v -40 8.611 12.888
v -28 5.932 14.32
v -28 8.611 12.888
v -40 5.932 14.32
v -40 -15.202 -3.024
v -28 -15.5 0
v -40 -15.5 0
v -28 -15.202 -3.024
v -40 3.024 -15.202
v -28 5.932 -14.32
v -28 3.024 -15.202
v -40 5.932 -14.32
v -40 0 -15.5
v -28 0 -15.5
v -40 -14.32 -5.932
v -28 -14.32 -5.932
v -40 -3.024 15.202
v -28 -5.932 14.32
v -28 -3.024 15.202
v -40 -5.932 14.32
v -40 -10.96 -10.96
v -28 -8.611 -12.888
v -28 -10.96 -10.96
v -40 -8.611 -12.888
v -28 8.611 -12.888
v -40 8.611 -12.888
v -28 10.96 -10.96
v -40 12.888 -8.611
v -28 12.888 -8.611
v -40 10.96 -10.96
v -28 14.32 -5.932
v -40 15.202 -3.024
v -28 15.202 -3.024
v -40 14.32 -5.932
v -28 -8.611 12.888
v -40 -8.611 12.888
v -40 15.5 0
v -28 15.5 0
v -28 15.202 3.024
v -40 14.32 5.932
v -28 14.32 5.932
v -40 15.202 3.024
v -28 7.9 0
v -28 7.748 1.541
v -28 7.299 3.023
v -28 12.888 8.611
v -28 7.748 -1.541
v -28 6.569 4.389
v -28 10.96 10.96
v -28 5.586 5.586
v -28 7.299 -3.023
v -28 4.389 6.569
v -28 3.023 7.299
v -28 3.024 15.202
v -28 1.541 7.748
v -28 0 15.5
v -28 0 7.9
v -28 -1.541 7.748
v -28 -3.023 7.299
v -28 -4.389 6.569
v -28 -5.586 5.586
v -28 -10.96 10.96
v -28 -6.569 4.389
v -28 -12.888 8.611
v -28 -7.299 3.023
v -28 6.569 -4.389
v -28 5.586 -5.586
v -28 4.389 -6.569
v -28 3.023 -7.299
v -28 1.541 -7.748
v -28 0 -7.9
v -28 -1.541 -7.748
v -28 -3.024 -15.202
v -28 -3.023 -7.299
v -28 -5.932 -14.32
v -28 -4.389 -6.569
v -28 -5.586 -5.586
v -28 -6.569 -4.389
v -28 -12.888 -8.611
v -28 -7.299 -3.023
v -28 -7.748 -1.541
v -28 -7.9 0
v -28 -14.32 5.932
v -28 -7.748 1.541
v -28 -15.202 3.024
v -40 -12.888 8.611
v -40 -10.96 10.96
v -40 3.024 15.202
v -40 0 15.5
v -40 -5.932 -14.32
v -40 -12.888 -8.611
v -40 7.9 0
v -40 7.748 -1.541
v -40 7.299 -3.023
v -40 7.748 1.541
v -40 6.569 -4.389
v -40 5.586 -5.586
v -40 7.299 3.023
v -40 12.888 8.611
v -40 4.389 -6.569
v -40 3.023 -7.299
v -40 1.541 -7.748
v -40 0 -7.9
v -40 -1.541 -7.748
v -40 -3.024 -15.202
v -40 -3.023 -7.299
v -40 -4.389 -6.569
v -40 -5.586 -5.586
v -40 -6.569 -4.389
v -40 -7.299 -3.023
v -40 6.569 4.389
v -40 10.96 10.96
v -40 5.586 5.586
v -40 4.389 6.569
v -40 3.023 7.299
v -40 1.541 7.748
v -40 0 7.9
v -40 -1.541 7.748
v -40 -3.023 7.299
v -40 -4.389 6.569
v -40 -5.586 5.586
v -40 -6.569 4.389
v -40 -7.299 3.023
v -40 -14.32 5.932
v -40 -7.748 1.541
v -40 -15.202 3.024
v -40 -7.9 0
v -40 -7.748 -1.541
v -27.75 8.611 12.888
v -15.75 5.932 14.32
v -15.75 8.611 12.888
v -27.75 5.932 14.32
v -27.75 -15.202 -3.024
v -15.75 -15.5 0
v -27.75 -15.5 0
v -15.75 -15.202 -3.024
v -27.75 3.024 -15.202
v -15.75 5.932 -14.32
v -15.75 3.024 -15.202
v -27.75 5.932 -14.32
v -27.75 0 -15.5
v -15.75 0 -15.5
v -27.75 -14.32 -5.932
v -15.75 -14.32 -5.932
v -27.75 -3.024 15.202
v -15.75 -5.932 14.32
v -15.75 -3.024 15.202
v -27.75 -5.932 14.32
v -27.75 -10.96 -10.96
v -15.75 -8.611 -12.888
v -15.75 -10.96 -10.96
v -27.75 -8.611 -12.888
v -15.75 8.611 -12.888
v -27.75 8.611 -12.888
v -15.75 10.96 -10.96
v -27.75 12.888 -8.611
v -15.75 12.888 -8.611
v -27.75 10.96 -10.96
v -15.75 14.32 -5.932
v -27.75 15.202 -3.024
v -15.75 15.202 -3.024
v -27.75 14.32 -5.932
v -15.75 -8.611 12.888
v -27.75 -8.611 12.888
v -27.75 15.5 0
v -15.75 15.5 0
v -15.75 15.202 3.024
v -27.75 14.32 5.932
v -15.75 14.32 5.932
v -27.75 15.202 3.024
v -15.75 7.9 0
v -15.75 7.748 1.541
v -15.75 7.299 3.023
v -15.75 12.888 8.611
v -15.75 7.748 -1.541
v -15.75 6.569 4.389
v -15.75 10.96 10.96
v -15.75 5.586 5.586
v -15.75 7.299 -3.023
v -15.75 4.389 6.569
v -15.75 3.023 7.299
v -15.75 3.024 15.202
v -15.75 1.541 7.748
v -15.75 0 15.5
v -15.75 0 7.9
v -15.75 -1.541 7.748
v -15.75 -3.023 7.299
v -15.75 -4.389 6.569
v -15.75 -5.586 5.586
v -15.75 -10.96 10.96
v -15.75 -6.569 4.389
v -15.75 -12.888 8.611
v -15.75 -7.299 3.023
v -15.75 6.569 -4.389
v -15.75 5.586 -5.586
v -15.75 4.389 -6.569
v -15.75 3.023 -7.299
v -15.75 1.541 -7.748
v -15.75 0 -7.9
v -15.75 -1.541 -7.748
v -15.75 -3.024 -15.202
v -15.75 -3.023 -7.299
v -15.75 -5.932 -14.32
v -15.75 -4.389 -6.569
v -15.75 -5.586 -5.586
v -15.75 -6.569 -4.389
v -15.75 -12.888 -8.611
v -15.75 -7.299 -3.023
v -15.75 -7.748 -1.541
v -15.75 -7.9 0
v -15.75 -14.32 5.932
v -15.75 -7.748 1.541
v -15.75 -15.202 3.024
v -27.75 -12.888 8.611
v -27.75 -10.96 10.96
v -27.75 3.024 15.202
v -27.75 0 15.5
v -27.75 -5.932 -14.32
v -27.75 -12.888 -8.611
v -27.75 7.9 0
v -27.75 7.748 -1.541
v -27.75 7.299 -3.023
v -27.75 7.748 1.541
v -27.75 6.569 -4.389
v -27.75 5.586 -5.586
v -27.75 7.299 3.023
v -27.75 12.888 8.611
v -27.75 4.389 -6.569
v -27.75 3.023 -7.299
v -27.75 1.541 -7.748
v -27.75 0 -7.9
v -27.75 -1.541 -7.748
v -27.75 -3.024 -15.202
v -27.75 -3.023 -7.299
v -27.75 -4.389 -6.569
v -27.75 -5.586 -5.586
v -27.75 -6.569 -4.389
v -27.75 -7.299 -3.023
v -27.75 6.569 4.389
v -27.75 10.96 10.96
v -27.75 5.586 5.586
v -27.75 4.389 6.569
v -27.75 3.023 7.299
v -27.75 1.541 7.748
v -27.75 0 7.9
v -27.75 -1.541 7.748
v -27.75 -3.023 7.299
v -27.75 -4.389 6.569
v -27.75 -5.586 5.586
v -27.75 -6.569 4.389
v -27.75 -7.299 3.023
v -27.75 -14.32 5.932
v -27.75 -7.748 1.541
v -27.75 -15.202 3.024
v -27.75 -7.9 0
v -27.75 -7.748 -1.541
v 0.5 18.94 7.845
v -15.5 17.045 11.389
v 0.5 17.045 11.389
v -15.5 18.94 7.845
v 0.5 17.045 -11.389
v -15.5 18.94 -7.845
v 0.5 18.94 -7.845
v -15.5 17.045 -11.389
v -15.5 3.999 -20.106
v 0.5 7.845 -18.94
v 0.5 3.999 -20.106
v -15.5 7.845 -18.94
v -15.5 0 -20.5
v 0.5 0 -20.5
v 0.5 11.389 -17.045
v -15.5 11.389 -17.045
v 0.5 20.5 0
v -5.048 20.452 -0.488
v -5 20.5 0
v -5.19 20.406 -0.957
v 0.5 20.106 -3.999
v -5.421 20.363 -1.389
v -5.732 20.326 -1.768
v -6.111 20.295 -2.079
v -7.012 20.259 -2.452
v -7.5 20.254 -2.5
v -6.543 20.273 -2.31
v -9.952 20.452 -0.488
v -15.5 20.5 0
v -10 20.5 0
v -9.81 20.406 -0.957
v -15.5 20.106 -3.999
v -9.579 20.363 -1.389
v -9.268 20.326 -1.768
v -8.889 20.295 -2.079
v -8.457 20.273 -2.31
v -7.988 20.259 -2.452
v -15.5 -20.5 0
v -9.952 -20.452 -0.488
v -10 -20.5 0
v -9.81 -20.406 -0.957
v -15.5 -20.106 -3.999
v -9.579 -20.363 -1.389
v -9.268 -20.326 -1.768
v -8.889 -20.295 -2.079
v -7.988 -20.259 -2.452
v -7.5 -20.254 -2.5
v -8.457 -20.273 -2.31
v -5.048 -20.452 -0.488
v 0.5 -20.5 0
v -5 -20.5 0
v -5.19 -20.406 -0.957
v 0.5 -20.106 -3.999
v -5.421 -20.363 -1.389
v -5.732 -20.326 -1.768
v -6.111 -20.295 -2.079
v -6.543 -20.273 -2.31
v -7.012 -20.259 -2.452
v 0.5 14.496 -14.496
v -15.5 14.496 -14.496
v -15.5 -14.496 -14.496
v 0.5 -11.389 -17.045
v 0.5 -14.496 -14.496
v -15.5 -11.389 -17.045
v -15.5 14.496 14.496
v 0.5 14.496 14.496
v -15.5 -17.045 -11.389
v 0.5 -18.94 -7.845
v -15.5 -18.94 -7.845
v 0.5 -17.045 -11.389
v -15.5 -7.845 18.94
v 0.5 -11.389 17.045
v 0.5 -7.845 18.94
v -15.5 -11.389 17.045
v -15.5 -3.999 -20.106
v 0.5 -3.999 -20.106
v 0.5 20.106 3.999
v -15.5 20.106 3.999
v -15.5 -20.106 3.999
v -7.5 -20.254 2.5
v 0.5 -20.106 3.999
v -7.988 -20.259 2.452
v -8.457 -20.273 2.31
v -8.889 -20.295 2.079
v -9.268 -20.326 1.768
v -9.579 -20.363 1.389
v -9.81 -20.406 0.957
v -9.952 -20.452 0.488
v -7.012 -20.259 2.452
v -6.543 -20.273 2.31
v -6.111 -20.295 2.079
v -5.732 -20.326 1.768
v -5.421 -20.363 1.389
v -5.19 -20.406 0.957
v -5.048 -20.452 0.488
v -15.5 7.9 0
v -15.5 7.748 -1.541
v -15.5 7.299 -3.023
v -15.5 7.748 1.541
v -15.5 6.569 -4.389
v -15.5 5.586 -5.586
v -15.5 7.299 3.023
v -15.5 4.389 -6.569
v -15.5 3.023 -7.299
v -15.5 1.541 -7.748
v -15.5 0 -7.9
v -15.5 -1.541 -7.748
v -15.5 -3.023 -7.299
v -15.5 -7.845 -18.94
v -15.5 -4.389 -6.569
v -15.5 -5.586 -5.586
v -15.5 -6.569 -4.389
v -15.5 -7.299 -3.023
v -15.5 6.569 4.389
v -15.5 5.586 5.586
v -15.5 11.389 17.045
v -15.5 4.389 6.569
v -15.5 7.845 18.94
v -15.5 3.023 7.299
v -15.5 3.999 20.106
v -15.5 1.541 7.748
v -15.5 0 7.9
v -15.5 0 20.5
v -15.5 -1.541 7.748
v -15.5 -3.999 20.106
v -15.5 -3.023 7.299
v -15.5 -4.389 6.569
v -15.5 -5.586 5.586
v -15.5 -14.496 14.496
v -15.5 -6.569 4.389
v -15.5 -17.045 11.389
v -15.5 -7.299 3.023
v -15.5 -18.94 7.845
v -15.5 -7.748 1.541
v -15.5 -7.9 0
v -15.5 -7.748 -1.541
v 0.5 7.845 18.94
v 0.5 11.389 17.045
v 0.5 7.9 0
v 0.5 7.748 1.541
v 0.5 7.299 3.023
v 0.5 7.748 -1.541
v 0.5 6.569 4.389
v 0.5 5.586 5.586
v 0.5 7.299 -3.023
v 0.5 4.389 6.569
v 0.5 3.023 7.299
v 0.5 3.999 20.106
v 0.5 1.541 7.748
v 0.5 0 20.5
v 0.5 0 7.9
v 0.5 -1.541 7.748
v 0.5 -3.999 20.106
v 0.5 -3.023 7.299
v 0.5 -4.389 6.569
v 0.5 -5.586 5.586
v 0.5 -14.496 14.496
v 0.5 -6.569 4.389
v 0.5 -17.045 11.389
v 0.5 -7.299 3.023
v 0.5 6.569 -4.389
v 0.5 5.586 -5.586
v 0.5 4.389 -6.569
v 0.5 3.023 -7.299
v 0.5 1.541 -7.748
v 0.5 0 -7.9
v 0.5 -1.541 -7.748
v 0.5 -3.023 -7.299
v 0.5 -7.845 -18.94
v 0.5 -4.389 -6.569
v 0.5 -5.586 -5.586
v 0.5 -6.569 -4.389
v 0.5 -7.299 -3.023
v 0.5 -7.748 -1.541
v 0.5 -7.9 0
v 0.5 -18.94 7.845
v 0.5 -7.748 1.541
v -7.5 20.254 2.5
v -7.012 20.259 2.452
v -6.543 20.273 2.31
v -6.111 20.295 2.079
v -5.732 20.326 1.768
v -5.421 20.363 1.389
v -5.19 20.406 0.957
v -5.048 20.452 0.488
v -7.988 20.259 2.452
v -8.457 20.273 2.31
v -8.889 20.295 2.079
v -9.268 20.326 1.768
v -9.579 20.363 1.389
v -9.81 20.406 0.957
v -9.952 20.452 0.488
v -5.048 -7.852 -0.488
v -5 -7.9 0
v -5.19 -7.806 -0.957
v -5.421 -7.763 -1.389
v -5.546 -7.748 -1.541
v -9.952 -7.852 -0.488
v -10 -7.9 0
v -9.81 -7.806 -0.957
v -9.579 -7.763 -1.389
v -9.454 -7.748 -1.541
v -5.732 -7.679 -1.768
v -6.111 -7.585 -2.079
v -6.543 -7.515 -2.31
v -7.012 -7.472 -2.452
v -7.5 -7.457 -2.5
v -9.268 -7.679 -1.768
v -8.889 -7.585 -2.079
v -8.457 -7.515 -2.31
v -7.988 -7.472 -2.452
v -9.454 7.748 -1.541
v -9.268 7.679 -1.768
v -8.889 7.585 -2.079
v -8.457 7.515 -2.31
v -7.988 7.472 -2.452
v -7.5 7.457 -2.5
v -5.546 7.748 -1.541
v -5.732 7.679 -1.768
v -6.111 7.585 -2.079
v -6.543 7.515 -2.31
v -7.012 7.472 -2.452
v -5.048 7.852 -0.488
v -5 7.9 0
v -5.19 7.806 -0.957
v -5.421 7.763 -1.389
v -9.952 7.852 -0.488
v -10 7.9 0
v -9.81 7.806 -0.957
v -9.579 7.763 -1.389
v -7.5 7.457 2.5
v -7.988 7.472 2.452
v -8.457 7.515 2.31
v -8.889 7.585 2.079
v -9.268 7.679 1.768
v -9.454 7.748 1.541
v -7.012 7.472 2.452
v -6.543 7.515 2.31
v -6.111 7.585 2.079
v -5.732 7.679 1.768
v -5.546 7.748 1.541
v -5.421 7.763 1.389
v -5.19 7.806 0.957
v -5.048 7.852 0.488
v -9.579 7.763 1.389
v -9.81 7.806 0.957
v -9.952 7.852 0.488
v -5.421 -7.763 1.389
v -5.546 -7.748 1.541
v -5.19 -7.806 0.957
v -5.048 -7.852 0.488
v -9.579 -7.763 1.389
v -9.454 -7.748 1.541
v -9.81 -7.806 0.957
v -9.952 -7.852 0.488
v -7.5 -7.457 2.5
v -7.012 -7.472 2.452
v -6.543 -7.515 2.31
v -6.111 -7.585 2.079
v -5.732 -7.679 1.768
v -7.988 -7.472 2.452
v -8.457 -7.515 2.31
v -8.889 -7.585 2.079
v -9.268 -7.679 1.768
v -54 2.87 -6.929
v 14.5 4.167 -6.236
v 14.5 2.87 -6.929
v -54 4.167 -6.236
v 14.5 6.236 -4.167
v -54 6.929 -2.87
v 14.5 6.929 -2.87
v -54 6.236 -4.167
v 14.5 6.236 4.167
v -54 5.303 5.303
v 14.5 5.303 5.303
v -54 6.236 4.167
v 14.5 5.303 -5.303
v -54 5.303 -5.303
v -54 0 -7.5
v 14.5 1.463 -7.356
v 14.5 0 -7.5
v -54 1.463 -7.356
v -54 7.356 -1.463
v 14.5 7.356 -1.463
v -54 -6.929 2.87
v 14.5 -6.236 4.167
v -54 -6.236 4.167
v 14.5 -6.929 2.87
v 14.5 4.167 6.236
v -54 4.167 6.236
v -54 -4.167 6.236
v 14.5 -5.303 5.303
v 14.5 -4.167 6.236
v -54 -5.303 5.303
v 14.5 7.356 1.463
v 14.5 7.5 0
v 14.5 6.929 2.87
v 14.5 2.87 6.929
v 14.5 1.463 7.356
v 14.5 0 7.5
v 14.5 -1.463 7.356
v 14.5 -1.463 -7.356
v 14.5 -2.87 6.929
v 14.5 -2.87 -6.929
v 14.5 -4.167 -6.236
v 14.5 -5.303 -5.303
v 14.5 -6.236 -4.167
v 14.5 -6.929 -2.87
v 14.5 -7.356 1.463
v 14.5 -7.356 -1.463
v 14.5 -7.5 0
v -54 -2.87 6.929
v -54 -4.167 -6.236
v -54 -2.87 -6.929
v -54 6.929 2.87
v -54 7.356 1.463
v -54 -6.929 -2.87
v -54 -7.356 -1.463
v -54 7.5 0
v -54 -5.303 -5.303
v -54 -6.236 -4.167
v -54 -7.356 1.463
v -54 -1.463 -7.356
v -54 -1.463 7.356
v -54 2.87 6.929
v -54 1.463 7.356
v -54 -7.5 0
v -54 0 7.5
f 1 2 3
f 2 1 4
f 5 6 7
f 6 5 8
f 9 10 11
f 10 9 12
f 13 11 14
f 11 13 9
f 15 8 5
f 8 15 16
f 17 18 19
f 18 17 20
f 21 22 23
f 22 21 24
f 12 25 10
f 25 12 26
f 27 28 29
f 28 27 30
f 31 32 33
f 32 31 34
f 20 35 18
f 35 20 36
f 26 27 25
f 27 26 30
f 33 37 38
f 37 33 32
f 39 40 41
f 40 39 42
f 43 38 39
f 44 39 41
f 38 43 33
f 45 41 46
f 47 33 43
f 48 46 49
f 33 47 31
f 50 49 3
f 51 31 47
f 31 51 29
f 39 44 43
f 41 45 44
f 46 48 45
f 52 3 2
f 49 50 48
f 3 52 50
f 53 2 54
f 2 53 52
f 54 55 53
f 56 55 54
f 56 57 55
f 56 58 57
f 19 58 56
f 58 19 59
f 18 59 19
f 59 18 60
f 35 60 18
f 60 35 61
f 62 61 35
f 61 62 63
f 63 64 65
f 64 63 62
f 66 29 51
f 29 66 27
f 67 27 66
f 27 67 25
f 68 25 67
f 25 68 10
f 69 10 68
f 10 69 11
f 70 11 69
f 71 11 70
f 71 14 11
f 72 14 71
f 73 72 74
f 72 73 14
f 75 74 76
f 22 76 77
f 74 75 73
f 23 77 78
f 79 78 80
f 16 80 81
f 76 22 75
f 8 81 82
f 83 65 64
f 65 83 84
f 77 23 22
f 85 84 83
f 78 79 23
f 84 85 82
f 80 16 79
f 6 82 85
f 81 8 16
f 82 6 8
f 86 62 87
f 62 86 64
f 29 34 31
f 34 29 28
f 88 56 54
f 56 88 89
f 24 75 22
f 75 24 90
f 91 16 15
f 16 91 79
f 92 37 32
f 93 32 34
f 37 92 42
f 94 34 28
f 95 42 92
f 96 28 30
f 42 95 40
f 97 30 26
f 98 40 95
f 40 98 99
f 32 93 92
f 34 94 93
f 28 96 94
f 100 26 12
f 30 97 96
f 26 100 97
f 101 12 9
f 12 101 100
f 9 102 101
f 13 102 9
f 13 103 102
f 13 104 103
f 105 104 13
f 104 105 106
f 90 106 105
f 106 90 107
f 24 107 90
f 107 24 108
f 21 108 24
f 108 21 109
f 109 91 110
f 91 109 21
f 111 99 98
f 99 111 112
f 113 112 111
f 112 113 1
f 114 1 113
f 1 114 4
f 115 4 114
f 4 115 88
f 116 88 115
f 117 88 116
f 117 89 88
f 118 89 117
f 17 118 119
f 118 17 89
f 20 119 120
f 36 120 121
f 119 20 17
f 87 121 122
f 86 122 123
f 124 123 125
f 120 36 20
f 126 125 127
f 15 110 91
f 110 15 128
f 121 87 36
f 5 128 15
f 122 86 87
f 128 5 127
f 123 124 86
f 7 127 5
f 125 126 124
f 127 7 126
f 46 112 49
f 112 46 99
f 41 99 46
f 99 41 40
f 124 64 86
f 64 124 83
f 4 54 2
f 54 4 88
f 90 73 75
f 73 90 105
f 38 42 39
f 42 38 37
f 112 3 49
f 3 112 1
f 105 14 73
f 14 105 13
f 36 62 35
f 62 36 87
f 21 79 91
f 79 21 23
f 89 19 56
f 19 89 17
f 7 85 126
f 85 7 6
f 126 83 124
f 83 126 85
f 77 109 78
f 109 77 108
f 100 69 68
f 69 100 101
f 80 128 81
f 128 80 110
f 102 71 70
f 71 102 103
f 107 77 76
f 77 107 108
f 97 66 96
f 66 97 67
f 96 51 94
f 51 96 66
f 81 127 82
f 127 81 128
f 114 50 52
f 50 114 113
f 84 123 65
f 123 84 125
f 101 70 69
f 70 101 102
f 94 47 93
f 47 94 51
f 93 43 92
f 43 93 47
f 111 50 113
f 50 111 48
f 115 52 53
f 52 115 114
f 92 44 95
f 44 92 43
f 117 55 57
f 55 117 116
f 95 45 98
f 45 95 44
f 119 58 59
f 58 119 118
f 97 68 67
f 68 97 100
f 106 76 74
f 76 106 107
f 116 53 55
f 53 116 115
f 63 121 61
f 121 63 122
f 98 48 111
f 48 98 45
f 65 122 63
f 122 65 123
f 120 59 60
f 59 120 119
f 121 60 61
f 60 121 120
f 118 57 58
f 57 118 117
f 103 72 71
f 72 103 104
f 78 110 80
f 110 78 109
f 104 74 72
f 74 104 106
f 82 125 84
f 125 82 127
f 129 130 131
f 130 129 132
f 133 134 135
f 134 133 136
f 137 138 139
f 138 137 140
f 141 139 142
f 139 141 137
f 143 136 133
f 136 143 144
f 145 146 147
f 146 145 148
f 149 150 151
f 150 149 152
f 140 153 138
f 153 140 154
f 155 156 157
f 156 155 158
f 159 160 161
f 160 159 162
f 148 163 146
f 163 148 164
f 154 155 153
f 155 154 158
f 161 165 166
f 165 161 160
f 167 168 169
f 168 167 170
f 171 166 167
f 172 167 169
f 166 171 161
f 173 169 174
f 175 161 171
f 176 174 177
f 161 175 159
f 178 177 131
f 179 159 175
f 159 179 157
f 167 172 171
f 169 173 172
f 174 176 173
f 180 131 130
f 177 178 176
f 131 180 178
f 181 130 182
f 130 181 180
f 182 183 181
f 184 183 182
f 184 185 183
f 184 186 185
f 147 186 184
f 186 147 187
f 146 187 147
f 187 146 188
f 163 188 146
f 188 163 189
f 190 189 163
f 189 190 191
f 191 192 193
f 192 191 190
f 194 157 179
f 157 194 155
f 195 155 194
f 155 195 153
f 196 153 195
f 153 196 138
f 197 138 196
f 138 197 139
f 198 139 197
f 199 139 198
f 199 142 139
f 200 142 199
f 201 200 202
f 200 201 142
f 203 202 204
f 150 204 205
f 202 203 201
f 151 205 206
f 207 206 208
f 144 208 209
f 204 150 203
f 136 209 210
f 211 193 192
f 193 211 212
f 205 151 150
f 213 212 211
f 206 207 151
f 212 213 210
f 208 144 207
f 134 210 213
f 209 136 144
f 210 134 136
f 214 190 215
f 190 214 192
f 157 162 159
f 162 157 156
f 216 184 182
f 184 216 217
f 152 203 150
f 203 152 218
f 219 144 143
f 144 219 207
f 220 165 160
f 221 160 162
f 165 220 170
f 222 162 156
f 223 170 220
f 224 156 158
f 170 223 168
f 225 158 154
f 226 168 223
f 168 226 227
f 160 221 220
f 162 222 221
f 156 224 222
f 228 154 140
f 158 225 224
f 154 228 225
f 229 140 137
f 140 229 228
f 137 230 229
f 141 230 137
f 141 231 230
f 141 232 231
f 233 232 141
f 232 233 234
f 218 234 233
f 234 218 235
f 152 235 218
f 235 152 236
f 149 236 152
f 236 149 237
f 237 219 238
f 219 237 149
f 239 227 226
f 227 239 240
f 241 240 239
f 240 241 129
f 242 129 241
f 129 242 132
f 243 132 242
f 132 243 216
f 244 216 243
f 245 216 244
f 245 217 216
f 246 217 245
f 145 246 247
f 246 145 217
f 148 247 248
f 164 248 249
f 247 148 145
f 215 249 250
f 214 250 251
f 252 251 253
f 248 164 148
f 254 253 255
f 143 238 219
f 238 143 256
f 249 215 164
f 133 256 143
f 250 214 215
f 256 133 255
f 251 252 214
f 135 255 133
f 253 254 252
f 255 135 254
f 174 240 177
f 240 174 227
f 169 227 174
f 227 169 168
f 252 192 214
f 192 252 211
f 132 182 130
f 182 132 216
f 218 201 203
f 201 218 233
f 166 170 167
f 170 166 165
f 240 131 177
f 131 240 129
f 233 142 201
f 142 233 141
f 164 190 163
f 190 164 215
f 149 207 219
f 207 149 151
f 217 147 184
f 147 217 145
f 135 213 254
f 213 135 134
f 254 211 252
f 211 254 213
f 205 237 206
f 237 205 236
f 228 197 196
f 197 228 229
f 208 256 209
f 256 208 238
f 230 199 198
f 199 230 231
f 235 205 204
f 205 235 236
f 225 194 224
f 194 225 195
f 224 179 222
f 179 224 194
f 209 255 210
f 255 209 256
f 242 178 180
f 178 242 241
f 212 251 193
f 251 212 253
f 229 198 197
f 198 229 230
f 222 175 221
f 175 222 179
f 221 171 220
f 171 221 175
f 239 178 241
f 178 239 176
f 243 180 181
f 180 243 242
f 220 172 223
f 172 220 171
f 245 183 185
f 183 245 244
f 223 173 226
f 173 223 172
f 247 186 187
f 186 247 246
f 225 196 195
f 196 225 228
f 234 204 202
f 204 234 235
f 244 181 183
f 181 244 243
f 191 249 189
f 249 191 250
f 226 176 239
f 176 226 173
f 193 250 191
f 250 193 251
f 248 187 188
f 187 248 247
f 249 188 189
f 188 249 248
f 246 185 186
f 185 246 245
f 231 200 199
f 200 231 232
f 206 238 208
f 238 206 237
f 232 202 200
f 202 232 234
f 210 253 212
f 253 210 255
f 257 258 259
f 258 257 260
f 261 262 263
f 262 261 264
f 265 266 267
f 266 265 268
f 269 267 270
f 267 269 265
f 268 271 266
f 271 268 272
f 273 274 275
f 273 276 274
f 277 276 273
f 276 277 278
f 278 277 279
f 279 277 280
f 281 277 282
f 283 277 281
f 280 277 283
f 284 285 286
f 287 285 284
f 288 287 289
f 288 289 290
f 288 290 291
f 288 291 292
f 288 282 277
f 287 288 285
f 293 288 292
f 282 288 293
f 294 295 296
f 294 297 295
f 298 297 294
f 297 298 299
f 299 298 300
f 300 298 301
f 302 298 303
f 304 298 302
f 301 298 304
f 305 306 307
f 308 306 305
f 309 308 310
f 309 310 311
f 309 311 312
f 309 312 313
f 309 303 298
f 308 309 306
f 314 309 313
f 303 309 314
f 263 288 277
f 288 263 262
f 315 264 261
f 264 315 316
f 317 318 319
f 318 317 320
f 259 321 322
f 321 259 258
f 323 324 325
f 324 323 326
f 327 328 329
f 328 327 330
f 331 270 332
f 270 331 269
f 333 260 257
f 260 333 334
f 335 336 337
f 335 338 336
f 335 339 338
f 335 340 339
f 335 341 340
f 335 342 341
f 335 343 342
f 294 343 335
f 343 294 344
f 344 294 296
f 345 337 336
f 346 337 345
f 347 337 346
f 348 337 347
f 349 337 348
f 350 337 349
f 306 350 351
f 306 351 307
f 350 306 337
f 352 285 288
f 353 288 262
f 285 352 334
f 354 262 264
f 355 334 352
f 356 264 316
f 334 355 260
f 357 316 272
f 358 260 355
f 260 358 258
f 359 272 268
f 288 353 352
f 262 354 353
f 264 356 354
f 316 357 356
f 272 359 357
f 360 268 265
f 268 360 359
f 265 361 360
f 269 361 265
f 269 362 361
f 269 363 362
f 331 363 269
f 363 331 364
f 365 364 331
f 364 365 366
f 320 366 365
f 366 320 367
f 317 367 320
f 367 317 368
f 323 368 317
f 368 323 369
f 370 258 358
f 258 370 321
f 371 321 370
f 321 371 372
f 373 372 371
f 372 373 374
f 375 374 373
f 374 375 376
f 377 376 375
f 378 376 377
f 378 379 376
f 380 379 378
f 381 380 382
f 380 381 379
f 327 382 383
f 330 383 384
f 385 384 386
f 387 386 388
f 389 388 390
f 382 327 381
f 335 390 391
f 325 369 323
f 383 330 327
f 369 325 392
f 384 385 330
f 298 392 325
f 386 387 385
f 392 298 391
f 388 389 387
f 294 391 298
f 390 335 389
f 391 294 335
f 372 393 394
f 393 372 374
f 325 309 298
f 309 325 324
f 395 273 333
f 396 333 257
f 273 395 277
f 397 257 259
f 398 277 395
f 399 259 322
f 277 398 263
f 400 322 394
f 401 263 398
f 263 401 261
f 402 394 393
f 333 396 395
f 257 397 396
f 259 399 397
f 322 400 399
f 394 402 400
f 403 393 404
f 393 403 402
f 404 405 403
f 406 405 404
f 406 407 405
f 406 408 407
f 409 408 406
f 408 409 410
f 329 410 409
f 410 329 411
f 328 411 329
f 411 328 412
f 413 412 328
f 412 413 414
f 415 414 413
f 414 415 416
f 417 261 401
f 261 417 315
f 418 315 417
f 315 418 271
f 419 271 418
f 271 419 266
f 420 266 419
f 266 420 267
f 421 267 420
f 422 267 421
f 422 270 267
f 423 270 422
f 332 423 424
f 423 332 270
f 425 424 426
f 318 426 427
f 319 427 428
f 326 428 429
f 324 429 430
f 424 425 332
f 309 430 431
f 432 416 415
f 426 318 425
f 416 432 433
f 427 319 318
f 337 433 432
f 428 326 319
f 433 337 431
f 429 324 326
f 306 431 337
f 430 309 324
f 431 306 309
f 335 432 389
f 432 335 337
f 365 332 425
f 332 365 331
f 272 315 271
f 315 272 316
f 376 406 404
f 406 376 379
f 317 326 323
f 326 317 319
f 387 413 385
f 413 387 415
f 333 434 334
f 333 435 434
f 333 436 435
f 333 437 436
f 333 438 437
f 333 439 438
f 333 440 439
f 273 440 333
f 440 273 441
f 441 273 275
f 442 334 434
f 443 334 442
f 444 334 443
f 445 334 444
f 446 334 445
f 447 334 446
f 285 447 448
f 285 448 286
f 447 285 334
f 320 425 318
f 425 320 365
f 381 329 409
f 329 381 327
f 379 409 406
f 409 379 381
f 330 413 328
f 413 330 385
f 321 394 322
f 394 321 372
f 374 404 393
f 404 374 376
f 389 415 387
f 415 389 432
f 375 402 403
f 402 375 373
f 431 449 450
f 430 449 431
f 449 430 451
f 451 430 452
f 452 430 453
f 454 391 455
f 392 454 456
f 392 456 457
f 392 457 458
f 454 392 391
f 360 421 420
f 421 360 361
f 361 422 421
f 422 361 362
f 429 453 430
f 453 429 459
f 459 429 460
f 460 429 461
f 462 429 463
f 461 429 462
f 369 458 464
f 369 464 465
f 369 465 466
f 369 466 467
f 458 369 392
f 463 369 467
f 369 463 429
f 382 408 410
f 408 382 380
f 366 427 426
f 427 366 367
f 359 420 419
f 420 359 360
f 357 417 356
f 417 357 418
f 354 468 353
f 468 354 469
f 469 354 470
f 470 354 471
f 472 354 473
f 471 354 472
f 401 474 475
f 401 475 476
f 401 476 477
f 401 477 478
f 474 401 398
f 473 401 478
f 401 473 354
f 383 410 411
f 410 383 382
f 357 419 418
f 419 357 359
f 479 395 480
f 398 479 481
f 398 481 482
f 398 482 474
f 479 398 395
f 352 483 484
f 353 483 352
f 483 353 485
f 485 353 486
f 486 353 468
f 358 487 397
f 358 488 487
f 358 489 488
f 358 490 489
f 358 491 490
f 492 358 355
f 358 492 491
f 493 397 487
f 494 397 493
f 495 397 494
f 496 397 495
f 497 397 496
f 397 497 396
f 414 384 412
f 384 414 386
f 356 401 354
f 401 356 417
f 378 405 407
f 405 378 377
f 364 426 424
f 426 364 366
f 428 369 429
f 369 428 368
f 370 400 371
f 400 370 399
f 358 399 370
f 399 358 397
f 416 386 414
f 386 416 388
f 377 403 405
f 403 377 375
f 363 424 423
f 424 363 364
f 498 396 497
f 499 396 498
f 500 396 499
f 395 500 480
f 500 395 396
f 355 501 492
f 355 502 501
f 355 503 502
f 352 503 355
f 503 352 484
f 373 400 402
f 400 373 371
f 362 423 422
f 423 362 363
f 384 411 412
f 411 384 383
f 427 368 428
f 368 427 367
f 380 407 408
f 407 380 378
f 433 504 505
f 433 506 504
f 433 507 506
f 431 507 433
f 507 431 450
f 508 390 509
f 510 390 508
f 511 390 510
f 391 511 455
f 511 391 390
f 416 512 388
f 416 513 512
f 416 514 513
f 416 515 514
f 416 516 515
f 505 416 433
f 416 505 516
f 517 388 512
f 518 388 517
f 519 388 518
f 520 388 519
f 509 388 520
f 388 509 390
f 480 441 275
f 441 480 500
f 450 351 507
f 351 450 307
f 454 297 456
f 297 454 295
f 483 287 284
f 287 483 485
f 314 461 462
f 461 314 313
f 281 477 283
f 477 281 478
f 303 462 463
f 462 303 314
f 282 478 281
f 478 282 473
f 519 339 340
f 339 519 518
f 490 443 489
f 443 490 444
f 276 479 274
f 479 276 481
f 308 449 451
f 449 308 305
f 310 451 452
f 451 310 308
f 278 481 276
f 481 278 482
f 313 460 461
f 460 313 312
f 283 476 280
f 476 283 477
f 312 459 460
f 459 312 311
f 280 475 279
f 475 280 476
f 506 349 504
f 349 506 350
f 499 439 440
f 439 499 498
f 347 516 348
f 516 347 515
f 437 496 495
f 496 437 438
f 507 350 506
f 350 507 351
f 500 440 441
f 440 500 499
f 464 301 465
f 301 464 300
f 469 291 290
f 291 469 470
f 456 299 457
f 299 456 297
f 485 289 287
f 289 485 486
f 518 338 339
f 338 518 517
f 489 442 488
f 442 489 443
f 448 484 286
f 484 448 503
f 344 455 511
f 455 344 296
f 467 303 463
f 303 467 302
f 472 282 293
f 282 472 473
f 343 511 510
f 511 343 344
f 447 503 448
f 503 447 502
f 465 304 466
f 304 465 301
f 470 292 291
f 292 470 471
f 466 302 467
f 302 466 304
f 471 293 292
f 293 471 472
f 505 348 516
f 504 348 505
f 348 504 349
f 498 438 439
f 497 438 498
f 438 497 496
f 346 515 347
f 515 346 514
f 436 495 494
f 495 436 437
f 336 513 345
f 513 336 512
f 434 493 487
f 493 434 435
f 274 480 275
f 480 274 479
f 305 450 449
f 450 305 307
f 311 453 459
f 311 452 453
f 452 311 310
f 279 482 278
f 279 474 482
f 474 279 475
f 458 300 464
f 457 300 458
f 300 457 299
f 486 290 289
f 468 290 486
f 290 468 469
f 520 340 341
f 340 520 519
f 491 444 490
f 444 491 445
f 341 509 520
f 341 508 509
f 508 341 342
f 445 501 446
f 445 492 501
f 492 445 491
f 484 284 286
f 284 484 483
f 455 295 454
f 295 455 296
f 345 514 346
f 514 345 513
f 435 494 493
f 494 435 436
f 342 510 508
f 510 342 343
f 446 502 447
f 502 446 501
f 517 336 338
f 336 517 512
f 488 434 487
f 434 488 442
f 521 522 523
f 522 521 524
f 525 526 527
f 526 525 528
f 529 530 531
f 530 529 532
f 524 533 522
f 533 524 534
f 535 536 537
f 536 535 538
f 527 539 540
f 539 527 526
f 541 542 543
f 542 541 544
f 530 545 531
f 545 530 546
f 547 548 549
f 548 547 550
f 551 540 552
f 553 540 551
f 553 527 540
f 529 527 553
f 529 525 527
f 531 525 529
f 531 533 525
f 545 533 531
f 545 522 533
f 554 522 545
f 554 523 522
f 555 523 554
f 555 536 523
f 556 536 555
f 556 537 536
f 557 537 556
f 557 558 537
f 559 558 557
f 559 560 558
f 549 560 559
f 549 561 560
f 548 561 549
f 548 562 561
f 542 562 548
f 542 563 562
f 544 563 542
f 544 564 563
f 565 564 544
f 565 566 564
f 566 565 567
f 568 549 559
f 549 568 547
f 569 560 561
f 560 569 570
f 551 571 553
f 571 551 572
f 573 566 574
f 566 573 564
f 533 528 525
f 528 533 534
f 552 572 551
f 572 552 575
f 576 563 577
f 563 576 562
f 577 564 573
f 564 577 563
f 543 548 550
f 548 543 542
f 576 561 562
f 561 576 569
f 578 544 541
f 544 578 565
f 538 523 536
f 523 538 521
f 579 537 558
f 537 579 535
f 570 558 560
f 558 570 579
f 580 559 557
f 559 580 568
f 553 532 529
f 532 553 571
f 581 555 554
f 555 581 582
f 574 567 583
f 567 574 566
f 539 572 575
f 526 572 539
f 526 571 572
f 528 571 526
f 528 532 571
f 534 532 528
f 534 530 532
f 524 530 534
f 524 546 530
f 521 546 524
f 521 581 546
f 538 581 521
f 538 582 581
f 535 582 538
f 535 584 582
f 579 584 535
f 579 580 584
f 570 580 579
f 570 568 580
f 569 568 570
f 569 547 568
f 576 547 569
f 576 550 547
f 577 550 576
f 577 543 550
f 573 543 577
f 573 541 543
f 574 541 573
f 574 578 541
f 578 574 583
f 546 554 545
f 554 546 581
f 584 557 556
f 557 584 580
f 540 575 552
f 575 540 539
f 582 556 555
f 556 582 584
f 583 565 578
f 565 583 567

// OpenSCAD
$fn = 32;

// ------------------------------------------------------------------------
// Shaft with rings and collars: d15 shaft, 3 rings
// Every part is its own module, assembly() places them once.
// ------------------------------------------------------------------------

// --- part 1 ---
module shaft() {
  translate([0, 0, -34.25]) cylinder(h = 68.5, d = 15);
}

// --- part 2 ---
module spacer_a() {
  difference() {
      translate([0, 0, 0]) cylinder(h = 12, d = 31);
      translate([0, 0, -1]) cylinder(h = 14, d = 15.8);
    }
}

// --- part 3 ---
module spacer_b() {
  difference() {
      translate([0, 0, 0]) cylinder(h = 12, d = 31);
      translate([0, 0, -1]) cylinder(h = 14, d = 15.8);
    }
}

// --- part 4 ---
module collar_a() {
  difference() {
    cylinder(h = 16, d = 41);
    translate([0, 0, -1]) cylinder(h = 18, d = 15.8);
    translate([0, 0, 8]) rotate([90, 0, 0]) cylinder(h = 43, d = 5, center = true);
  }
}

// --- assembly ---
module assembly() {
  translate([-19.75, 0, 0]) rotate([0, 90, 0]) shaft();
  translate([-40, 0, 0]) rotate([0, 90, 0]) spacer_a();
  translate([-27.75, 0, 0]) rotate([0, 90, 0]) spacer_b();
  translate([-15.5, 0, 0]) rotate([0, 90, 0]) collar_a();
}

assembly();
